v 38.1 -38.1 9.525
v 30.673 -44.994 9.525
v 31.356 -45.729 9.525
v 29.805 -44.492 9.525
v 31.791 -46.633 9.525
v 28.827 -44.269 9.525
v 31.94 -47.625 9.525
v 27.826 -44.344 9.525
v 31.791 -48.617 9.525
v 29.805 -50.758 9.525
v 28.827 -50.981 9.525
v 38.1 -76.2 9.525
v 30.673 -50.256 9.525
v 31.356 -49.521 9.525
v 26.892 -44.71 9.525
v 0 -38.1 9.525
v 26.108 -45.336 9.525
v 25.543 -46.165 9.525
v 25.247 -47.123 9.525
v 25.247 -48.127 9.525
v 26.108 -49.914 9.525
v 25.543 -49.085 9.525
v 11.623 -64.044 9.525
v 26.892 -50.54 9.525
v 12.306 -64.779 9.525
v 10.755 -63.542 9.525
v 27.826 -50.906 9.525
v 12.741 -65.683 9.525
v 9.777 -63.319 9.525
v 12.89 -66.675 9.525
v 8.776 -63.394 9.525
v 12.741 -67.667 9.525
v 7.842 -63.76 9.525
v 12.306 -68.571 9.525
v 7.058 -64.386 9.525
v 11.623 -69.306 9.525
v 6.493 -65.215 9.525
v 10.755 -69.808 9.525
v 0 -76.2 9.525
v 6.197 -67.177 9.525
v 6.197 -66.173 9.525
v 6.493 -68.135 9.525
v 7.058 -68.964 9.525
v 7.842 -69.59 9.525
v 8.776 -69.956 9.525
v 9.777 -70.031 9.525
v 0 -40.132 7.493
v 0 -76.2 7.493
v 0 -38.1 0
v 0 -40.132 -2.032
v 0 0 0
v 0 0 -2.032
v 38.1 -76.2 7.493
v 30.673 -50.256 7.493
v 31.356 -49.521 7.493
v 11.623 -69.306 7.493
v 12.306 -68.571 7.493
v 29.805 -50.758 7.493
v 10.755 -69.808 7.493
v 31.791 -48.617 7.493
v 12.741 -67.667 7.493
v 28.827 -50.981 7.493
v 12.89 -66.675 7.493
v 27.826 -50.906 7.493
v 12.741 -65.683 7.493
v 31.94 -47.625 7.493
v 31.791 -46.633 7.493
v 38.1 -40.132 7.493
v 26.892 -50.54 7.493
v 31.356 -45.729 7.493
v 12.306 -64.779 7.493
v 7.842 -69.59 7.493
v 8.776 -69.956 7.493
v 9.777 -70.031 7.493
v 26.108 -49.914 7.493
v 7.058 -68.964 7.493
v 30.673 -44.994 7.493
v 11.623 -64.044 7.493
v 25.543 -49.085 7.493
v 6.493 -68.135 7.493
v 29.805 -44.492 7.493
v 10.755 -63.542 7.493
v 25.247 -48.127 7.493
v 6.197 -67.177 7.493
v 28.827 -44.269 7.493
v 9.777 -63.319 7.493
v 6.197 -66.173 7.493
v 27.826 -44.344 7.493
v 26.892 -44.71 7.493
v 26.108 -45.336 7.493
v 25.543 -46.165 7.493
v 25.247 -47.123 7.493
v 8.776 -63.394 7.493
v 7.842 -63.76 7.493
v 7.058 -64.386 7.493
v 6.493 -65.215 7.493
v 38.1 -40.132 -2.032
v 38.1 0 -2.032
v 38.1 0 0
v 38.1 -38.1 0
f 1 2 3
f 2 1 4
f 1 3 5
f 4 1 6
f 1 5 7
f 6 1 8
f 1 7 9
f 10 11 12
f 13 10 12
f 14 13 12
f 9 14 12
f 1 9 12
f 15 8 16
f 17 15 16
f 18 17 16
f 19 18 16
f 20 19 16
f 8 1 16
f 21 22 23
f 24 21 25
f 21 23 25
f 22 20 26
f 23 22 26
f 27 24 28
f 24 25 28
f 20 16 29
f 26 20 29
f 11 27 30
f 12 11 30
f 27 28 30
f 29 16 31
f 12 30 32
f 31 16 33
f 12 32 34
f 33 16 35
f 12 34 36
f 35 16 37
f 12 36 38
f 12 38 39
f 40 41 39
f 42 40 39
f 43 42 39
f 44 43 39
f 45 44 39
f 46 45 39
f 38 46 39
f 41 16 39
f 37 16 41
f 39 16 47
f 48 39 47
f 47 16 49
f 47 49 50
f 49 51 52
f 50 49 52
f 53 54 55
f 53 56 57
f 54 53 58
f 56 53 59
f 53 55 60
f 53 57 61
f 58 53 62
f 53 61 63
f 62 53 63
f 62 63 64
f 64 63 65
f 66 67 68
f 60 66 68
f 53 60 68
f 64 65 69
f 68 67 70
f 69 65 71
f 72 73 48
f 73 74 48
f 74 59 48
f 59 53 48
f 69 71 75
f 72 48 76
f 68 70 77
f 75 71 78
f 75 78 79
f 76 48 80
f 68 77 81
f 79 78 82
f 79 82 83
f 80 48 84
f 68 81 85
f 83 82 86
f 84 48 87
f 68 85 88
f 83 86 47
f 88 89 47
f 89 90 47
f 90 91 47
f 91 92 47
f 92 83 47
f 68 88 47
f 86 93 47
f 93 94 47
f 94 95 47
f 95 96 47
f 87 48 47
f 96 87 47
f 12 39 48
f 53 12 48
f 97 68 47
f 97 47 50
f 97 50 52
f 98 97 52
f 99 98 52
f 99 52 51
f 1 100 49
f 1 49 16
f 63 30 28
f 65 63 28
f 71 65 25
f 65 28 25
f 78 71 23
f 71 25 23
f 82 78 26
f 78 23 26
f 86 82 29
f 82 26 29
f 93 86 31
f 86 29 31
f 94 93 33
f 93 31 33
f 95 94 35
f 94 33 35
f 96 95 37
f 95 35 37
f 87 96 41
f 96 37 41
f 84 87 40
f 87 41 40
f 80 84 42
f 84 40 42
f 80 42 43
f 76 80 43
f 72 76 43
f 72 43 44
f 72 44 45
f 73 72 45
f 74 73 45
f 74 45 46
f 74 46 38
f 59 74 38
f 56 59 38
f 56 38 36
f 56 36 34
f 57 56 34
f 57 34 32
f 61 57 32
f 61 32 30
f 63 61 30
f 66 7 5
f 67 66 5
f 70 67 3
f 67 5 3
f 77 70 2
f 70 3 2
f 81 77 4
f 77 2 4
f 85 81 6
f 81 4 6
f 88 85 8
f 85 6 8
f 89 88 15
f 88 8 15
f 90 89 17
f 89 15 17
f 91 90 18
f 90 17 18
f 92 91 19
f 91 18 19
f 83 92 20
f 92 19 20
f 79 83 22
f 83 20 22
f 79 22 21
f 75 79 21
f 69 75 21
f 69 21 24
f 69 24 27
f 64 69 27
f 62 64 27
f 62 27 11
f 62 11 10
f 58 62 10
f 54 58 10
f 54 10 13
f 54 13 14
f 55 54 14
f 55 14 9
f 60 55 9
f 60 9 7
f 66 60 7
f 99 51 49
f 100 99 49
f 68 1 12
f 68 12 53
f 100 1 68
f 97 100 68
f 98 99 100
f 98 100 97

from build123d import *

# Parameters (mm, degrees)
BOSS_EXTRUDE1_DEPTH = 38.1
SKETCH2_R           = 3.3655
CUT_EXTRUDE1_DEPTH  = 12.557


with BuildPart() as part:
    # Sketch1 → Boss-Extrude1 (new body)
    with BuildSketch(Plane(origin=(0, 0, 0), x_dir=(0, 0, -1), z_dir=(1, 0, 0))):
        Polygon((0, 0), (0, -38.1), (-9.525, -38.1), (-9.525, -76.2), (-7.493, -76.2), (-7.493, -40.132), (2.032, -40.132), (2.032, 0), align=None)
    extrude(amount=BOSS_EXTRUDE1_DEPTH)

    # Sketch2 → Cut-Extrude1 (cut, through all)
    with BuildSketch(Plane.XY.offset(9.525)):
        with Locations((9.525, -66.675)):
            Circle(SKETCH2_R)
        with Locations((28.575, -47.625)):
            Circle(SKETCH2_R)
    extrude(amount=-CUT_EXTRUDE1_DEPTH, mode=Mode.SUBTRACT)


solid = part.part
